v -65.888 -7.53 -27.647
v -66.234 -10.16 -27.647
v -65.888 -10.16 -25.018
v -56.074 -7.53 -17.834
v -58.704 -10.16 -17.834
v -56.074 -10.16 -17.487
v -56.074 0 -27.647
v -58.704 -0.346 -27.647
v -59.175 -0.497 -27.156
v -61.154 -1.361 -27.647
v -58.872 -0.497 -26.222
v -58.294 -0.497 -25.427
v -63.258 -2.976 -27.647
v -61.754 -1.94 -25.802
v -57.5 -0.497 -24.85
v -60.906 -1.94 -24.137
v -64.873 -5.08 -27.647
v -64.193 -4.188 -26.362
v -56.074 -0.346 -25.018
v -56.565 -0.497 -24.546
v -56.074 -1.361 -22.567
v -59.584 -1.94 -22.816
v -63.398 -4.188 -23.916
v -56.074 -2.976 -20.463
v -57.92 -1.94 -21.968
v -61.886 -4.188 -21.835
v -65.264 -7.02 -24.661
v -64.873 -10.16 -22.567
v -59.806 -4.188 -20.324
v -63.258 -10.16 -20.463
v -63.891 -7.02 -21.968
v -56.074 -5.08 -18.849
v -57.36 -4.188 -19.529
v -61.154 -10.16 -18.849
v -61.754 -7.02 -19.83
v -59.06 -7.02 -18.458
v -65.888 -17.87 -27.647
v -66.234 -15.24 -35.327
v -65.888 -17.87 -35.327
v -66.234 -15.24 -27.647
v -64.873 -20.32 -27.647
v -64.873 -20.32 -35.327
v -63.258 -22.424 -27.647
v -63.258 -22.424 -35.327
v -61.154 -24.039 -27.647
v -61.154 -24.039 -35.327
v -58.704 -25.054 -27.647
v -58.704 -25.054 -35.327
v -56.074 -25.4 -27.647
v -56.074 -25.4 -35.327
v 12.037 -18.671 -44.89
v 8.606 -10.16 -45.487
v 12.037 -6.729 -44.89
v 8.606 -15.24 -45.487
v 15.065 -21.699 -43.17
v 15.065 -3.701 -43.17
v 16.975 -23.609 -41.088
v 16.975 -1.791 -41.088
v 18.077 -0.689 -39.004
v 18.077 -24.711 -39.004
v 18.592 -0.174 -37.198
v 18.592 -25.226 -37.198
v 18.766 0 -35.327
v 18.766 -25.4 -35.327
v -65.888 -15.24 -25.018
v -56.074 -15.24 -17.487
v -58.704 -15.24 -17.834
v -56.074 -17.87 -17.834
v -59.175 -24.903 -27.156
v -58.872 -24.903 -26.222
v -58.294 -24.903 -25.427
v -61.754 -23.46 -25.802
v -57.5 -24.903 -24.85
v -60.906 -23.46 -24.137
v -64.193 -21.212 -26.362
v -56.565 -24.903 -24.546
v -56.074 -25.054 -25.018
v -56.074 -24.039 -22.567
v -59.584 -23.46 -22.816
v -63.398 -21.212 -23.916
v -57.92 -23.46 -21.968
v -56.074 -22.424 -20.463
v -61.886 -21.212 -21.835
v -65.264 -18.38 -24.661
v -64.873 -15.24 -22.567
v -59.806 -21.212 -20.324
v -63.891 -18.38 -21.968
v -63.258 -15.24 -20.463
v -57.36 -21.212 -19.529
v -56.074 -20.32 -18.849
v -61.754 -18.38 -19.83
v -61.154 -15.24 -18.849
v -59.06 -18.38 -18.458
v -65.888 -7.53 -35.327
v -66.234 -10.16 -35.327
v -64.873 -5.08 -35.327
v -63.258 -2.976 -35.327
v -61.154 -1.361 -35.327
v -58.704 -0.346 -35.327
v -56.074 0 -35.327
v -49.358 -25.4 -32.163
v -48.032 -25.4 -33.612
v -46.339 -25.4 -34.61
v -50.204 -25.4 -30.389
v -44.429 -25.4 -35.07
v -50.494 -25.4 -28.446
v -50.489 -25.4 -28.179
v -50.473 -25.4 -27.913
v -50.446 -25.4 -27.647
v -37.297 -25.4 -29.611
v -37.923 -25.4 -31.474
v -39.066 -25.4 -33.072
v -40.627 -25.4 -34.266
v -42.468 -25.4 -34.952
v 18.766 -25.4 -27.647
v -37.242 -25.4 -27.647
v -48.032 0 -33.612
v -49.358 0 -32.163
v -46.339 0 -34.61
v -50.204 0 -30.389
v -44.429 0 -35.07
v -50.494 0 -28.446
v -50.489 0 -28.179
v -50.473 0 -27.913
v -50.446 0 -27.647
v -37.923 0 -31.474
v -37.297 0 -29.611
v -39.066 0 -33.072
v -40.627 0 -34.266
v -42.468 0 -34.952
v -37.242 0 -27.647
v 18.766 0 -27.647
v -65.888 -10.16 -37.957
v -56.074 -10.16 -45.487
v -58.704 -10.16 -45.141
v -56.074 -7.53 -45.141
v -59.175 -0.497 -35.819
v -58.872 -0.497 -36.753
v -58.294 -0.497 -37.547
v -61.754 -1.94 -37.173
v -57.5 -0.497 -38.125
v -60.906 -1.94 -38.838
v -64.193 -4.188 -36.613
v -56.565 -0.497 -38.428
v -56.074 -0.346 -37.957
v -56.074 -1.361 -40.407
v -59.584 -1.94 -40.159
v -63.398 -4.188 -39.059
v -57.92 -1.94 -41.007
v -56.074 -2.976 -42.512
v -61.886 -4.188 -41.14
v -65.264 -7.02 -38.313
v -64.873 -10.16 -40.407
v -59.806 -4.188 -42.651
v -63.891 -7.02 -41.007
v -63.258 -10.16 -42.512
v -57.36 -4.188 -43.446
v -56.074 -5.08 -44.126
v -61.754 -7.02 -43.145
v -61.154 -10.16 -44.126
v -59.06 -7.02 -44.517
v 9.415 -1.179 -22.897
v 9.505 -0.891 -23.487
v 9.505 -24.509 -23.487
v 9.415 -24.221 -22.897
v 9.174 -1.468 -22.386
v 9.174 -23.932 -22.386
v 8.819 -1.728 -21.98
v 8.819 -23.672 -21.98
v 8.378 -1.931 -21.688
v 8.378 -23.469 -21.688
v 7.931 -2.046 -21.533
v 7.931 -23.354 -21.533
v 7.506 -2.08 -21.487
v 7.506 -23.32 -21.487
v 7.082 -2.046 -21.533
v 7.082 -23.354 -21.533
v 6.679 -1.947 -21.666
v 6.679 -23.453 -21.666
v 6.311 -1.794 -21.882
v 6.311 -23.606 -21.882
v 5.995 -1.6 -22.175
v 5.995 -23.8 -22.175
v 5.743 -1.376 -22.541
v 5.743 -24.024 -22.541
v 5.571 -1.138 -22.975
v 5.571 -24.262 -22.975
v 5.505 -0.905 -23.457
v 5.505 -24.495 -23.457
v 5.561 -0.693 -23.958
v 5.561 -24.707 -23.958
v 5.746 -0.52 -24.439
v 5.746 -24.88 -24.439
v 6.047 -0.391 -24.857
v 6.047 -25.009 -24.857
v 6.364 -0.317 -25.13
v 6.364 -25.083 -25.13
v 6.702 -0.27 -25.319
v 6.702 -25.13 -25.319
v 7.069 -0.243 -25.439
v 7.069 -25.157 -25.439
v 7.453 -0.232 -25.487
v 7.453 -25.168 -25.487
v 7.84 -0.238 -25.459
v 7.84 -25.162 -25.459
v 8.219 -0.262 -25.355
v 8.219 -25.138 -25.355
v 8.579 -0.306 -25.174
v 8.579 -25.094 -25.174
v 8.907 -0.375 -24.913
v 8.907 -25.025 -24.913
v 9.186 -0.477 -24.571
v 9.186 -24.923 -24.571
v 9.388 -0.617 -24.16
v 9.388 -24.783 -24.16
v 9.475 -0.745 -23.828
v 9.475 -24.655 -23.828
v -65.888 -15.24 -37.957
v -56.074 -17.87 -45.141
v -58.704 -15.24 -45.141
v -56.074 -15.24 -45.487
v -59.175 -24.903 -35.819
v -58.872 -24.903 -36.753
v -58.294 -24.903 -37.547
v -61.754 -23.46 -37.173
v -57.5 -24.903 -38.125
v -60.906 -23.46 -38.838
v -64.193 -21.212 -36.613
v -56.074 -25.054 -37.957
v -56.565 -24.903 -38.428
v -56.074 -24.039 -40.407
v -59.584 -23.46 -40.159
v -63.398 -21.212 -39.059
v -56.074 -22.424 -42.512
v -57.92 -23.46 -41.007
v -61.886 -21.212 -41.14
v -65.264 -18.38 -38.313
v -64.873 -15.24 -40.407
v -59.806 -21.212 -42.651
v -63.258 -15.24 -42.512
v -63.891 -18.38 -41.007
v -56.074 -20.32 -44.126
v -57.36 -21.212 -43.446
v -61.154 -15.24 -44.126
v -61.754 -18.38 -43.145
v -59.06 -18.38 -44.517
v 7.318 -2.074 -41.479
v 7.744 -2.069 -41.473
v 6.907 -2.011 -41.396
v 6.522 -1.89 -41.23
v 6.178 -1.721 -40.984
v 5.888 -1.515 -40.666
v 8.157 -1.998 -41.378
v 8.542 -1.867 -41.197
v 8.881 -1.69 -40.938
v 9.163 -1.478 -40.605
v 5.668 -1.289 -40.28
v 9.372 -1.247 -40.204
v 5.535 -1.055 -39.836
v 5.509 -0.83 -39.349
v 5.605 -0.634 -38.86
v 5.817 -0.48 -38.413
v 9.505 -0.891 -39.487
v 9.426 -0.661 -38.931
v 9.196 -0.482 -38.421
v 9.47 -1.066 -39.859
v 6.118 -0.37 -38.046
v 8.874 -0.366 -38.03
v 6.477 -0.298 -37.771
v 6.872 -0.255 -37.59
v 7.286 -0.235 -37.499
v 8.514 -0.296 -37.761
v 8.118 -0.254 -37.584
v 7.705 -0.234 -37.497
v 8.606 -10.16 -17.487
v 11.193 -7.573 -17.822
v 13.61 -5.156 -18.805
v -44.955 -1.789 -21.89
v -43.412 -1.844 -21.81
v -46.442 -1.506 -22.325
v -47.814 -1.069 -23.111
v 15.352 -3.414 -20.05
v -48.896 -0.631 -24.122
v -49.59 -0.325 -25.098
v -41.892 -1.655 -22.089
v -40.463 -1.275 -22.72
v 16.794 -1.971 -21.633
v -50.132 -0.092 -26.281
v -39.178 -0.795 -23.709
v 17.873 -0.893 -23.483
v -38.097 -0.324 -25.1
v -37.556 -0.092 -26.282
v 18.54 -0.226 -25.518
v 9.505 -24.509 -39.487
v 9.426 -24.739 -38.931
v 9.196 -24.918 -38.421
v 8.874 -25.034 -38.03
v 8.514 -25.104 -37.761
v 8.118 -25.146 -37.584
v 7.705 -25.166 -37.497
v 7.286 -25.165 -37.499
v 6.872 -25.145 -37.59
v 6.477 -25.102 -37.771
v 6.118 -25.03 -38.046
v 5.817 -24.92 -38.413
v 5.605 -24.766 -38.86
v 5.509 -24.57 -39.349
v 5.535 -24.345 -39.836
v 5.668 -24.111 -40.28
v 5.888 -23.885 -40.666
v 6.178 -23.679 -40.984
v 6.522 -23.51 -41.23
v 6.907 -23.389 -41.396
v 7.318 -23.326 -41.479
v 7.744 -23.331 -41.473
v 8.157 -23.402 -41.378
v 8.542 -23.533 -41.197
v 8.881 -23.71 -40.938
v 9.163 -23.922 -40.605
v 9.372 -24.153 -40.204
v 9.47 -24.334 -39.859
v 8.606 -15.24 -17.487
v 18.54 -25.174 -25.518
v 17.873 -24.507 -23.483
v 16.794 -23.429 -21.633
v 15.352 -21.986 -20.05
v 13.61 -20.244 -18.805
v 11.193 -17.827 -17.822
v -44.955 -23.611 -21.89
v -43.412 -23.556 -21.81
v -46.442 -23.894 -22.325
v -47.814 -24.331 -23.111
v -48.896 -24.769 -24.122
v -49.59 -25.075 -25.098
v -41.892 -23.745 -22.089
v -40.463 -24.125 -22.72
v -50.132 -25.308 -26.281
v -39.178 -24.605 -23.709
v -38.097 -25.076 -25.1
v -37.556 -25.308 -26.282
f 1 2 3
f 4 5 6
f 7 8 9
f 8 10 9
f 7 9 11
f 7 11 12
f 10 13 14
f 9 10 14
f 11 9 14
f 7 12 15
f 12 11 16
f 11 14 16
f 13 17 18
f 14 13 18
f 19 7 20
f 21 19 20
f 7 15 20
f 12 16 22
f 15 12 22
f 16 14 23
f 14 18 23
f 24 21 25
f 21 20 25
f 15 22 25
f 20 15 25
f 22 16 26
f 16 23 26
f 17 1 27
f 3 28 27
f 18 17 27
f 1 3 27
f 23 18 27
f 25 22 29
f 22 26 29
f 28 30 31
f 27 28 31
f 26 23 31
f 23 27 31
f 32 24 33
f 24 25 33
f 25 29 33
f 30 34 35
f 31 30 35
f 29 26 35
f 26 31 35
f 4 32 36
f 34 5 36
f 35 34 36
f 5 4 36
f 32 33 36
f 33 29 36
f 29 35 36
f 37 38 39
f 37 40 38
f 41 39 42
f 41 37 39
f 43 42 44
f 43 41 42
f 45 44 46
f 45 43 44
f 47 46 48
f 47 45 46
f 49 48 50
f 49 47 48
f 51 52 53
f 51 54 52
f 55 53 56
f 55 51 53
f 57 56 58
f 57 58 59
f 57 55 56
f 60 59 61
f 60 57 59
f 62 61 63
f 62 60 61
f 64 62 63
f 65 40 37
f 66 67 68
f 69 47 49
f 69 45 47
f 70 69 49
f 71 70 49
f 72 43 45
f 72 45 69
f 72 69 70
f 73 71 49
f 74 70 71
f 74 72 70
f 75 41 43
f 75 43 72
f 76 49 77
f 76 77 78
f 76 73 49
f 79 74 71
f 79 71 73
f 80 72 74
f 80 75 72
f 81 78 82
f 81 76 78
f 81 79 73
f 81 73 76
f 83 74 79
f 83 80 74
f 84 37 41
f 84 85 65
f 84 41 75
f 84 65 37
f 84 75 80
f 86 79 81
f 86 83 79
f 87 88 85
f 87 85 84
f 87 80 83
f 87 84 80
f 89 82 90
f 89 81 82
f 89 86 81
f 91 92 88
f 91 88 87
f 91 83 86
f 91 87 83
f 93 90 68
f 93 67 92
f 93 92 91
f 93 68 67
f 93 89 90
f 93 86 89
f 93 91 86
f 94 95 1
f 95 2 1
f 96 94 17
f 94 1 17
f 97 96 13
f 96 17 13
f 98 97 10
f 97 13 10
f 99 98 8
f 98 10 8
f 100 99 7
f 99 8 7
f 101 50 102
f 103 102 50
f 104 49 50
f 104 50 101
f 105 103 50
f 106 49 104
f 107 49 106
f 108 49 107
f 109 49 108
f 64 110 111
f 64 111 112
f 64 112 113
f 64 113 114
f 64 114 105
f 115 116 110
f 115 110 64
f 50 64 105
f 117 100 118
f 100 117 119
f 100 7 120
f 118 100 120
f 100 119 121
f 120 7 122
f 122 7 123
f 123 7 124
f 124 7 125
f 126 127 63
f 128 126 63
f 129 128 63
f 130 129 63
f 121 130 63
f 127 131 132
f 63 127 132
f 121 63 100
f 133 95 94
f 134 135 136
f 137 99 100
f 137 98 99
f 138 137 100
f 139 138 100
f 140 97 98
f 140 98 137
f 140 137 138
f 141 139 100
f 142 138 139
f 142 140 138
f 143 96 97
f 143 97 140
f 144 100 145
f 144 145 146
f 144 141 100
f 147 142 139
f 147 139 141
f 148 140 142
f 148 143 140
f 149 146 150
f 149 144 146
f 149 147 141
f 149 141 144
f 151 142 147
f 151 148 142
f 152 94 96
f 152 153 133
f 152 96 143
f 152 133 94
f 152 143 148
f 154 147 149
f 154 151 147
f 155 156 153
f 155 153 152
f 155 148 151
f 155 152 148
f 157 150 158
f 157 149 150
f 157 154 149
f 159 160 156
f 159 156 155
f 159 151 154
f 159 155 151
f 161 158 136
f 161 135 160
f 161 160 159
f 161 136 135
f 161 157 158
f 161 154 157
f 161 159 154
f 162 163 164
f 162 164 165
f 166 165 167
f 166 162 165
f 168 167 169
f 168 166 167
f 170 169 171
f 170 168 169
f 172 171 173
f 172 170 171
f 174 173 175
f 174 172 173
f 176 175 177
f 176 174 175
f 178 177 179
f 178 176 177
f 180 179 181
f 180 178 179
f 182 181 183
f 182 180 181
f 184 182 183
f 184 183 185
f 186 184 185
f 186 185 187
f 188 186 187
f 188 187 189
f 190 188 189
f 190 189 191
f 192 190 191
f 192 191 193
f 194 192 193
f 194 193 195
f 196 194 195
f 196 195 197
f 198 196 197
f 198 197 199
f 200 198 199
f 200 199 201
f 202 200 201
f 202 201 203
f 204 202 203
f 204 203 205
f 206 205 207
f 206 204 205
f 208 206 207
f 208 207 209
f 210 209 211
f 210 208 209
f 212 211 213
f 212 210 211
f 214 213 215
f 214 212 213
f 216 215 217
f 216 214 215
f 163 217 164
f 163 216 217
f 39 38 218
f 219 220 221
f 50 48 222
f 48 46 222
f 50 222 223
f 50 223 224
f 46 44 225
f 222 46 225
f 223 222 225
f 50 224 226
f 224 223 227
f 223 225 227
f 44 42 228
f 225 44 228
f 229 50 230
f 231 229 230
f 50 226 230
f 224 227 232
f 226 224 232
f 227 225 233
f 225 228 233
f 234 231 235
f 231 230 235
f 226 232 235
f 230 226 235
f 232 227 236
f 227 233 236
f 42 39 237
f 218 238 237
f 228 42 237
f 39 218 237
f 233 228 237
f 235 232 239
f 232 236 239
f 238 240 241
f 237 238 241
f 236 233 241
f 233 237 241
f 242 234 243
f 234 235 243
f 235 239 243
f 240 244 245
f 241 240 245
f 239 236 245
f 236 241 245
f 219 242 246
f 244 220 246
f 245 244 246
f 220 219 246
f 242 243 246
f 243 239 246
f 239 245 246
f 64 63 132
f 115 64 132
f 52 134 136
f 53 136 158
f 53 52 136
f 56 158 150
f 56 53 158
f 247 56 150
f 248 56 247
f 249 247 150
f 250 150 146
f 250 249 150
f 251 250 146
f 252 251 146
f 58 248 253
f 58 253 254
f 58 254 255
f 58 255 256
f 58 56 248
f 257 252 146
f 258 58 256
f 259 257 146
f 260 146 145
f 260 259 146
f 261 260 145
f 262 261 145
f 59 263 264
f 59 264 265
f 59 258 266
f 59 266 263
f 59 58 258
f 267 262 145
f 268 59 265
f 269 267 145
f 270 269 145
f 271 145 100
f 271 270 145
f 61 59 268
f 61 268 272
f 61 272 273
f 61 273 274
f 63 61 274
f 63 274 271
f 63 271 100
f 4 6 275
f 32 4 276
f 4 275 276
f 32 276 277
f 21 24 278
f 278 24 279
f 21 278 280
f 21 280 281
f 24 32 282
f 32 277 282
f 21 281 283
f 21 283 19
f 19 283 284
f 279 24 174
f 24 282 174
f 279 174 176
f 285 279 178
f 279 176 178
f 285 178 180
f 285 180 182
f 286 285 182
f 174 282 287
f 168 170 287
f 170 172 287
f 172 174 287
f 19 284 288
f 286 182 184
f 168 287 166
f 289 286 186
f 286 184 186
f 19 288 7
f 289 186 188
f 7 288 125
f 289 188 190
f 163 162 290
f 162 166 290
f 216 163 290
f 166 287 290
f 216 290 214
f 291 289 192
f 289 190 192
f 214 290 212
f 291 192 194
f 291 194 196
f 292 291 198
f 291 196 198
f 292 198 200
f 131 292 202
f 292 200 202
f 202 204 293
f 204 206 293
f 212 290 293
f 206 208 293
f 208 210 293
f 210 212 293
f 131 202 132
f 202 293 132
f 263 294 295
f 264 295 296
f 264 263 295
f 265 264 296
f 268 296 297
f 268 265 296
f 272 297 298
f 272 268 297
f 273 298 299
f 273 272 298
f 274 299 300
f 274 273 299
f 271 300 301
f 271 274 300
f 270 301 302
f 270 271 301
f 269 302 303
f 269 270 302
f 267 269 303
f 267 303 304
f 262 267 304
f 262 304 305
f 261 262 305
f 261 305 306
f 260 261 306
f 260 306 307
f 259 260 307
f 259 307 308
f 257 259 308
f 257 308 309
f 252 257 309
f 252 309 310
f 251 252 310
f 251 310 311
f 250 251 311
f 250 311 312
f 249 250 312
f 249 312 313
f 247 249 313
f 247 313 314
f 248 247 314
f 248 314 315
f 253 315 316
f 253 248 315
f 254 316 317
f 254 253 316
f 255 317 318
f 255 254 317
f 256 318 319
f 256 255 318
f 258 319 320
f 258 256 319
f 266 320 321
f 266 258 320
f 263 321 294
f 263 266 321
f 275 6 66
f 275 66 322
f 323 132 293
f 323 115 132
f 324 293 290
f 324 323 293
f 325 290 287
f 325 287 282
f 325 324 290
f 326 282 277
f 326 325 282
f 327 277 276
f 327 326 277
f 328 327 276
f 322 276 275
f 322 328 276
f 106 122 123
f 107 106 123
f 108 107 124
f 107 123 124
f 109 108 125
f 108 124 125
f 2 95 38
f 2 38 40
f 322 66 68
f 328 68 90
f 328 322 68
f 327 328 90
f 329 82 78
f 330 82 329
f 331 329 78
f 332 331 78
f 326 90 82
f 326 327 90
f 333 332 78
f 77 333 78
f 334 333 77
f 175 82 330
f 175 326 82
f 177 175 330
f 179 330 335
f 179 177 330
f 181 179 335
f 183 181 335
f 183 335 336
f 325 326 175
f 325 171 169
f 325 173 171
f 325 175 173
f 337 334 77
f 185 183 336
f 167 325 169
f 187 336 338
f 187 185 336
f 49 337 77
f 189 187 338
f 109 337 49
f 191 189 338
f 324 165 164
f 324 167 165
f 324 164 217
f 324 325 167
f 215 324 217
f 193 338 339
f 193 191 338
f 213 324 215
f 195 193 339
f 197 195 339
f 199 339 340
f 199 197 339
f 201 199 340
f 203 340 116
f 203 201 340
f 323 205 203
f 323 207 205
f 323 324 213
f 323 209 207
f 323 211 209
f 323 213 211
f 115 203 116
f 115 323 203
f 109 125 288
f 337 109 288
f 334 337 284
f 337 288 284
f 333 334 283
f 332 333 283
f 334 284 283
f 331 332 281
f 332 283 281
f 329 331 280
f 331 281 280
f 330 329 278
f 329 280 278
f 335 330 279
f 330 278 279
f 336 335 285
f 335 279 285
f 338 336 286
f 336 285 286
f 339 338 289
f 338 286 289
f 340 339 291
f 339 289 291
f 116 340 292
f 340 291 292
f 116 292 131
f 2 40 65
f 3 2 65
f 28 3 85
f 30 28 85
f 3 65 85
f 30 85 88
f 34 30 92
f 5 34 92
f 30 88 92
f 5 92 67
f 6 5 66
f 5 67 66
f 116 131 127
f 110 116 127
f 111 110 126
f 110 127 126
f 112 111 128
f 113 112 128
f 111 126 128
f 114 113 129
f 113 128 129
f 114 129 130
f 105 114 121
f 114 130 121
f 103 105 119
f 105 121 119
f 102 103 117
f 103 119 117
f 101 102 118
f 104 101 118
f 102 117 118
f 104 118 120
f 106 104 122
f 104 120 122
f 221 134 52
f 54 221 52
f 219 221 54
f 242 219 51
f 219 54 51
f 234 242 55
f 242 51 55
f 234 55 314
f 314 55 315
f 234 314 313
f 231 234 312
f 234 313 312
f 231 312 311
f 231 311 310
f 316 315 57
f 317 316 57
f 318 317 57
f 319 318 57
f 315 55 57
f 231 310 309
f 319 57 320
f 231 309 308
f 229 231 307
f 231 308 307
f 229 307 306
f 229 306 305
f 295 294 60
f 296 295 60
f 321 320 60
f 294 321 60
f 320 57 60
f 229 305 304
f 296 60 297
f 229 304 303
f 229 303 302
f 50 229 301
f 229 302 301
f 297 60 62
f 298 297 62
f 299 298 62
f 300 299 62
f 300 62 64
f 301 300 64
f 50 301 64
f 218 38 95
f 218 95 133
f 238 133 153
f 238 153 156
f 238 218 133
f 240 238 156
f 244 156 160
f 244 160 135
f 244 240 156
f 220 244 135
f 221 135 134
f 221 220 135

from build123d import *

# Parameters (mm, degrees)
F0_W     = 85
F0_H     = 28
F1_DEPTH = 25.4
F2_R     = 10.16
F4_DEPTH = 25.4
F5_R     = 2
F7_DEPTH = 35


with BuildPart() as f1:
    # F0 (on Front) → F1 (new body)
    with BuildSketch(Plane.XZ):
        with Locations((-23.7341526002, -31.4873820276)):
            Rectangle(F0_W, F0_H)
    extrude(amount=F1_DEPTH)

    # F2
    f2_edges = [f1.edges().sort_by_distance(p)[0] for p in [
        (-66.234153, -12.7, -17.487382),
        (-66.234153, -12.7, -45.487382),
        (-66.234153, 0, -31.487382),
        (-66.234153, -25.4, -31.487382),
        (18.765847, -12.7, -17.487382),
        (-23.734153, 0, -17.487382),
        (-23.734153, -25.4, -17.487382),
        (18.765847, -12.7, -45.487382),
        (-23.734153, 0, -45.487382),
        (-23.734153, -25.4, -45.487382),
    ]]
    fillet(f2_edges, radius=F2_R)

    # F3 (on face) → F4 (cut)
    with BuildSketch(Plane(origin=(0, 0, 0), x_dir=(-1, 0, 0), z_dir=(0, 1, 0))):
        with BuildLine():
            Line((37.2422865066, -27.6473820276), (50.4459766734, -27.6473820276))
            ThreePointArc((50.4459766734, -27.6473820276), (43.84413159, -21.7962196174), (37.2422865066, -27.6473820276))
        make_face()
        with BuildLine():
            ThreePointArc((37.2422865066, -27.6473820276), (43.4439877437, -35.0841699714), (50.49413159, -28.4462196174))
            ThreePointArc((50.49413159, -28.4462196174), (50.482081944, -28.0460757711), (50.4459766734, -27.6473820276))
            Line((50.4459766734, -27.6473820276), (37.2422865066, -27.6473820276))
        make_face()
    extrude(amount=-F4_DEPTH, mode=Mode.SUBTRACT)

    # F5 (on Front) → F7 (cut)
    with BuildSketch(Plane.XZ):
        with Locations((7.5045232661, -23.4873820276)):
            Circle(F5_R)
        with Locations((7.5045232661, -39.4873820276)):
            Circle(F5_R)
    extrude(amount=F7_DEPTH, mode=Mode.SUBTRACT)


solid = f1.part
